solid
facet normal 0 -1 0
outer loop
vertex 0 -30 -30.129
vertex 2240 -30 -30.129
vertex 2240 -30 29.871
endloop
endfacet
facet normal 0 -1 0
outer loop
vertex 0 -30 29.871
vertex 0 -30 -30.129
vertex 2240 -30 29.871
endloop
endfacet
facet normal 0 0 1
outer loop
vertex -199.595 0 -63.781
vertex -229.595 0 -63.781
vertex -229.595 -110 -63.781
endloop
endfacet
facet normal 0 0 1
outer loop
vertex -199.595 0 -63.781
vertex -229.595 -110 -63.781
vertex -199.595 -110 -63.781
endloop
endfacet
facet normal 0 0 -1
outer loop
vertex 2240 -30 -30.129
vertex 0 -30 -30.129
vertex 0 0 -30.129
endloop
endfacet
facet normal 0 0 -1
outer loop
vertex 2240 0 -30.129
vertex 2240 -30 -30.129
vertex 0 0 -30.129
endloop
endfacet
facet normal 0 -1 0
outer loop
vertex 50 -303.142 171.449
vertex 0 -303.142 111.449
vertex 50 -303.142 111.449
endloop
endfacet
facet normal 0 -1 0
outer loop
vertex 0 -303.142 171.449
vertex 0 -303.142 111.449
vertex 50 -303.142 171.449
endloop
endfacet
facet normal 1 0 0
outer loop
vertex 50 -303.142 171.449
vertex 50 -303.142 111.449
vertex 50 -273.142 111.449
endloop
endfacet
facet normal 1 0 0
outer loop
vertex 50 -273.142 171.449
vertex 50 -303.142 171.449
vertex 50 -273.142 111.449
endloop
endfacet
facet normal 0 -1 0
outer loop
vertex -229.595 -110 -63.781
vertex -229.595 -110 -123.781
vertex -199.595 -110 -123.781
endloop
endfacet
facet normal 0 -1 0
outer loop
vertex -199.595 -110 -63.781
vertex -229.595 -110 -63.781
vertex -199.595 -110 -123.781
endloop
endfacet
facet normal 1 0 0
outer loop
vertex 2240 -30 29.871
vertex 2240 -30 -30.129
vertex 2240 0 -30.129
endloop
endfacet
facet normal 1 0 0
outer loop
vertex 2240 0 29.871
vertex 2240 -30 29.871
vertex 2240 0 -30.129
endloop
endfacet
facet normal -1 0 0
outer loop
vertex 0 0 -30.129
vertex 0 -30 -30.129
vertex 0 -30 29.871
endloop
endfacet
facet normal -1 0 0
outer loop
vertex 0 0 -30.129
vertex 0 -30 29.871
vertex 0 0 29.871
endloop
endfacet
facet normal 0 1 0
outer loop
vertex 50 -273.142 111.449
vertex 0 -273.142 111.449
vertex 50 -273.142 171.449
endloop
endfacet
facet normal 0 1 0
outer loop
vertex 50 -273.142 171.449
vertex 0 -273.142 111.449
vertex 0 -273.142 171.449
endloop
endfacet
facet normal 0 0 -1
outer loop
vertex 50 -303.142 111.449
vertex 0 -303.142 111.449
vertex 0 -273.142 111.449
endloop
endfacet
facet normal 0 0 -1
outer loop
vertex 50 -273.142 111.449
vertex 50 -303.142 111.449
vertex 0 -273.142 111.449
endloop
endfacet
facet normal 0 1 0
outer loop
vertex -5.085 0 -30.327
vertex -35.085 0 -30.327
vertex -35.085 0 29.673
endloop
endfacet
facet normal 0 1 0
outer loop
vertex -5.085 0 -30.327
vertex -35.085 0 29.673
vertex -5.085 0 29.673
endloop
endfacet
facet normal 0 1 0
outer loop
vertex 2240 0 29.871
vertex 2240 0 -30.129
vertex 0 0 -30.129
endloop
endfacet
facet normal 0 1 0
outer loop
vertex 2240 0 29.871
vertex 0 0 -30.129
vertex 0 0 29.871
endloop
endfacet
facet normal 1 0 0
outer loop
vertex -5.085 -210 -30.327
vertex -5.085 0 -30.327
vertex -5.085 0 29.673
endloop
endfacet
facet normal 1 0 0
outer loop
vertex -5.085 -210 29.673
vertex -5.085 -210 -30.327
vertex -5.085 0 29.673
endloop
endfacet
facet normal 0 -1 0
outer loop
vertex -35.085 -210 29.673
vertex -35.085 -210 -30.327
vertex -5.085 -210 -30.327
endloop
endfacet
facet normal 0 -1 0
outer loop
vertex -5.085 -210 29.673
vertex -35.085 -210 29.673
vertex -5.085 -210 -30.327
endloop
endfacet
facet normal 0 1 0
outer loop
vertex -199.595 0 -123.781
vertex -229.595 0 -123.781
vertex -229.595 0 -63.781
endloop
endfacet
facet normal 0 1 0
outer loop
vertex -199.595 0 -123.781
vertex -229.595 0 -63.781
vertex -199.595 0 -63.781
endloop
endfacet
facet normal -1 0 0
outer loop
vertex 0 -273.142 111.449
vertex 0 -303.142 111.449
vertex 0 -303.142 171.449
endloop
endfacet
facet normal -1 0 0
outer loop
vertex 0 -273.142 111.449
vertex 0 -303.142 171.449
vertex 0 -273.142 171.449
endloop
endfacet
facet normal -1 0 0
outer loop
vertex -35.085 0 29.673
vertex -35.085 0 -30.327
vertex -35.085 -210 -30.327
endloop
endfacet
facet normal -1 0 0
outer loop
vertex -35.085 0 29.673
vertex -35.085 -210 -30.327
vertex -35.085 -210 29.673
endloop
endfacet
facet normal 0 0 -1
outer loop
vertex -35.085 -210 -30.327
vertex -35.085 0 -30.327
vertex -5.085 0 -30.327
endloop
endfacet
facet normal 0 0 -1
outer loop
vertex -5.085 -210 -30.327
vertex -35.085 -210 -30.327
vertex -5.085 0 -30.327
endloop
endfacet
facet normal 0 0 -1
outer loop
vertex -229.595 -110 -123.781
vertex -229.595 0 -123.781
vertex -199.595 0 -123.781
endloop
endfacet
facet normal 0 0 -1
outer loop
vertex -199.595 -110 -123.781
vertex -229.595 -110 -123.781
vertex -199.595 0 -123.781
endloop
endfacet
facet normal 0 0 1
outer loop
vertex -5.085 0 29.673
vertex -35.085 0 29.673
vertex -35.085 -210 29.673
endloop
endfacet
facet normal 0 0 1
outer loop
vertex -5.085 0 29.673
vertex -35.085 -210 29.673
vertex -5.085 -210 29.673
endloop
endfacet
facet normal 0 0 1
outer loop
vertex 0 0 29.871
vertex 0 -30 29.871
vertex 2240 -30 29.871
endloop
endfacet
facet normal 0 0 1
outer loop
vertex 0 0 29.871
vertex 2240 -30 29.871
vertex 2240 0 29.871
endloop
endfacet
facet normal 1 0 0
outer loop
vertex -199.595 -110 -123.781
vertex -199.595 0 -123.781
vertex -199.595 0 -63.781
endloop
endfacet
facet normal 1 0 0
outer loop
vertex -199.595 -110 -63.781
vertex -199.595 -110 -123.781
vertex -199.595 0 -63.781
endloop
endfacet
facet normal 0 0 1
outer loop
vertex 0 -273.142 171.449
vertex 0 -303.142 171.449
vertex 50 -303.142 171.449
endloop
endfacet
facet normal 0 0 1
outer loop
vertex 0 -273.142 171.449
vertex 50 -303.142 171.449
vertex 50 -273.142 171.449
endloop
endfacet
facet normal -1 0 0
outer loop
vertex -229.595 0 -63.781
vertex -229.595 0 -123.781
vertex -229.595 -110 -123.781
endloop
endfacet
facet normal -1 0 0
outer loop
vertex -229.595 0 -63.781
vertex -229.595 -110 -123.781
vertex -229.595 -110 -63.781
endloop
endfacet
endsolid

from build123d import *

# Parameters (mm, degrees)
F0_W     = 30
F0_H     = 60
F1_DEPTH = 2240
F2_W     = 30
F2_H     = 60
F3_DEPTH = 210
F4_W     = 30
F4_H     = 60
F5_DEPTH = 50
F6_W     = 30
F6_H     = 60
F7_DEPTH = 110


with BuildPart() as f1:
    # F0 (on Right) → F1 (new body)
    with BuildSketch(Plane.YZ):
        with Locations((-15, -0.129258)):
            Rectangle(F0_W, F0_H)
    extrude(amount=F1_DEPTH)


with BuildPart() as f3:
    # F2 (on Front) → F3 (new body)
    with BuildSketch(Plane.XZ):
        with Locations((-20.084896, -0.327069)):
            Rectangle(F2_W, F2_H)
    extrude(amount=F3_DEPTH)


with BuildPart() as f5:
    # F4 (on Right) → F5 (new body)
    with BuildSketch(Plane.YZ):
        with Locations((-288.141652, 141.449294)):
            Rectangle(F4_W, F4_H)
    extrude(amount=F5_DEPTH)


with BuildPart() as f7:
    # F6 (on Front) → F7 (new body)
    with BuildSketch(Plane.XZ):
        with Locations((-214.594885, -93.781063)):
            Rectangle(F6_W, F6_H)
    extrude(amount=F7_DEPTH)


solid = Compound([f1.part, f3.part, f5.part, f7.part])
